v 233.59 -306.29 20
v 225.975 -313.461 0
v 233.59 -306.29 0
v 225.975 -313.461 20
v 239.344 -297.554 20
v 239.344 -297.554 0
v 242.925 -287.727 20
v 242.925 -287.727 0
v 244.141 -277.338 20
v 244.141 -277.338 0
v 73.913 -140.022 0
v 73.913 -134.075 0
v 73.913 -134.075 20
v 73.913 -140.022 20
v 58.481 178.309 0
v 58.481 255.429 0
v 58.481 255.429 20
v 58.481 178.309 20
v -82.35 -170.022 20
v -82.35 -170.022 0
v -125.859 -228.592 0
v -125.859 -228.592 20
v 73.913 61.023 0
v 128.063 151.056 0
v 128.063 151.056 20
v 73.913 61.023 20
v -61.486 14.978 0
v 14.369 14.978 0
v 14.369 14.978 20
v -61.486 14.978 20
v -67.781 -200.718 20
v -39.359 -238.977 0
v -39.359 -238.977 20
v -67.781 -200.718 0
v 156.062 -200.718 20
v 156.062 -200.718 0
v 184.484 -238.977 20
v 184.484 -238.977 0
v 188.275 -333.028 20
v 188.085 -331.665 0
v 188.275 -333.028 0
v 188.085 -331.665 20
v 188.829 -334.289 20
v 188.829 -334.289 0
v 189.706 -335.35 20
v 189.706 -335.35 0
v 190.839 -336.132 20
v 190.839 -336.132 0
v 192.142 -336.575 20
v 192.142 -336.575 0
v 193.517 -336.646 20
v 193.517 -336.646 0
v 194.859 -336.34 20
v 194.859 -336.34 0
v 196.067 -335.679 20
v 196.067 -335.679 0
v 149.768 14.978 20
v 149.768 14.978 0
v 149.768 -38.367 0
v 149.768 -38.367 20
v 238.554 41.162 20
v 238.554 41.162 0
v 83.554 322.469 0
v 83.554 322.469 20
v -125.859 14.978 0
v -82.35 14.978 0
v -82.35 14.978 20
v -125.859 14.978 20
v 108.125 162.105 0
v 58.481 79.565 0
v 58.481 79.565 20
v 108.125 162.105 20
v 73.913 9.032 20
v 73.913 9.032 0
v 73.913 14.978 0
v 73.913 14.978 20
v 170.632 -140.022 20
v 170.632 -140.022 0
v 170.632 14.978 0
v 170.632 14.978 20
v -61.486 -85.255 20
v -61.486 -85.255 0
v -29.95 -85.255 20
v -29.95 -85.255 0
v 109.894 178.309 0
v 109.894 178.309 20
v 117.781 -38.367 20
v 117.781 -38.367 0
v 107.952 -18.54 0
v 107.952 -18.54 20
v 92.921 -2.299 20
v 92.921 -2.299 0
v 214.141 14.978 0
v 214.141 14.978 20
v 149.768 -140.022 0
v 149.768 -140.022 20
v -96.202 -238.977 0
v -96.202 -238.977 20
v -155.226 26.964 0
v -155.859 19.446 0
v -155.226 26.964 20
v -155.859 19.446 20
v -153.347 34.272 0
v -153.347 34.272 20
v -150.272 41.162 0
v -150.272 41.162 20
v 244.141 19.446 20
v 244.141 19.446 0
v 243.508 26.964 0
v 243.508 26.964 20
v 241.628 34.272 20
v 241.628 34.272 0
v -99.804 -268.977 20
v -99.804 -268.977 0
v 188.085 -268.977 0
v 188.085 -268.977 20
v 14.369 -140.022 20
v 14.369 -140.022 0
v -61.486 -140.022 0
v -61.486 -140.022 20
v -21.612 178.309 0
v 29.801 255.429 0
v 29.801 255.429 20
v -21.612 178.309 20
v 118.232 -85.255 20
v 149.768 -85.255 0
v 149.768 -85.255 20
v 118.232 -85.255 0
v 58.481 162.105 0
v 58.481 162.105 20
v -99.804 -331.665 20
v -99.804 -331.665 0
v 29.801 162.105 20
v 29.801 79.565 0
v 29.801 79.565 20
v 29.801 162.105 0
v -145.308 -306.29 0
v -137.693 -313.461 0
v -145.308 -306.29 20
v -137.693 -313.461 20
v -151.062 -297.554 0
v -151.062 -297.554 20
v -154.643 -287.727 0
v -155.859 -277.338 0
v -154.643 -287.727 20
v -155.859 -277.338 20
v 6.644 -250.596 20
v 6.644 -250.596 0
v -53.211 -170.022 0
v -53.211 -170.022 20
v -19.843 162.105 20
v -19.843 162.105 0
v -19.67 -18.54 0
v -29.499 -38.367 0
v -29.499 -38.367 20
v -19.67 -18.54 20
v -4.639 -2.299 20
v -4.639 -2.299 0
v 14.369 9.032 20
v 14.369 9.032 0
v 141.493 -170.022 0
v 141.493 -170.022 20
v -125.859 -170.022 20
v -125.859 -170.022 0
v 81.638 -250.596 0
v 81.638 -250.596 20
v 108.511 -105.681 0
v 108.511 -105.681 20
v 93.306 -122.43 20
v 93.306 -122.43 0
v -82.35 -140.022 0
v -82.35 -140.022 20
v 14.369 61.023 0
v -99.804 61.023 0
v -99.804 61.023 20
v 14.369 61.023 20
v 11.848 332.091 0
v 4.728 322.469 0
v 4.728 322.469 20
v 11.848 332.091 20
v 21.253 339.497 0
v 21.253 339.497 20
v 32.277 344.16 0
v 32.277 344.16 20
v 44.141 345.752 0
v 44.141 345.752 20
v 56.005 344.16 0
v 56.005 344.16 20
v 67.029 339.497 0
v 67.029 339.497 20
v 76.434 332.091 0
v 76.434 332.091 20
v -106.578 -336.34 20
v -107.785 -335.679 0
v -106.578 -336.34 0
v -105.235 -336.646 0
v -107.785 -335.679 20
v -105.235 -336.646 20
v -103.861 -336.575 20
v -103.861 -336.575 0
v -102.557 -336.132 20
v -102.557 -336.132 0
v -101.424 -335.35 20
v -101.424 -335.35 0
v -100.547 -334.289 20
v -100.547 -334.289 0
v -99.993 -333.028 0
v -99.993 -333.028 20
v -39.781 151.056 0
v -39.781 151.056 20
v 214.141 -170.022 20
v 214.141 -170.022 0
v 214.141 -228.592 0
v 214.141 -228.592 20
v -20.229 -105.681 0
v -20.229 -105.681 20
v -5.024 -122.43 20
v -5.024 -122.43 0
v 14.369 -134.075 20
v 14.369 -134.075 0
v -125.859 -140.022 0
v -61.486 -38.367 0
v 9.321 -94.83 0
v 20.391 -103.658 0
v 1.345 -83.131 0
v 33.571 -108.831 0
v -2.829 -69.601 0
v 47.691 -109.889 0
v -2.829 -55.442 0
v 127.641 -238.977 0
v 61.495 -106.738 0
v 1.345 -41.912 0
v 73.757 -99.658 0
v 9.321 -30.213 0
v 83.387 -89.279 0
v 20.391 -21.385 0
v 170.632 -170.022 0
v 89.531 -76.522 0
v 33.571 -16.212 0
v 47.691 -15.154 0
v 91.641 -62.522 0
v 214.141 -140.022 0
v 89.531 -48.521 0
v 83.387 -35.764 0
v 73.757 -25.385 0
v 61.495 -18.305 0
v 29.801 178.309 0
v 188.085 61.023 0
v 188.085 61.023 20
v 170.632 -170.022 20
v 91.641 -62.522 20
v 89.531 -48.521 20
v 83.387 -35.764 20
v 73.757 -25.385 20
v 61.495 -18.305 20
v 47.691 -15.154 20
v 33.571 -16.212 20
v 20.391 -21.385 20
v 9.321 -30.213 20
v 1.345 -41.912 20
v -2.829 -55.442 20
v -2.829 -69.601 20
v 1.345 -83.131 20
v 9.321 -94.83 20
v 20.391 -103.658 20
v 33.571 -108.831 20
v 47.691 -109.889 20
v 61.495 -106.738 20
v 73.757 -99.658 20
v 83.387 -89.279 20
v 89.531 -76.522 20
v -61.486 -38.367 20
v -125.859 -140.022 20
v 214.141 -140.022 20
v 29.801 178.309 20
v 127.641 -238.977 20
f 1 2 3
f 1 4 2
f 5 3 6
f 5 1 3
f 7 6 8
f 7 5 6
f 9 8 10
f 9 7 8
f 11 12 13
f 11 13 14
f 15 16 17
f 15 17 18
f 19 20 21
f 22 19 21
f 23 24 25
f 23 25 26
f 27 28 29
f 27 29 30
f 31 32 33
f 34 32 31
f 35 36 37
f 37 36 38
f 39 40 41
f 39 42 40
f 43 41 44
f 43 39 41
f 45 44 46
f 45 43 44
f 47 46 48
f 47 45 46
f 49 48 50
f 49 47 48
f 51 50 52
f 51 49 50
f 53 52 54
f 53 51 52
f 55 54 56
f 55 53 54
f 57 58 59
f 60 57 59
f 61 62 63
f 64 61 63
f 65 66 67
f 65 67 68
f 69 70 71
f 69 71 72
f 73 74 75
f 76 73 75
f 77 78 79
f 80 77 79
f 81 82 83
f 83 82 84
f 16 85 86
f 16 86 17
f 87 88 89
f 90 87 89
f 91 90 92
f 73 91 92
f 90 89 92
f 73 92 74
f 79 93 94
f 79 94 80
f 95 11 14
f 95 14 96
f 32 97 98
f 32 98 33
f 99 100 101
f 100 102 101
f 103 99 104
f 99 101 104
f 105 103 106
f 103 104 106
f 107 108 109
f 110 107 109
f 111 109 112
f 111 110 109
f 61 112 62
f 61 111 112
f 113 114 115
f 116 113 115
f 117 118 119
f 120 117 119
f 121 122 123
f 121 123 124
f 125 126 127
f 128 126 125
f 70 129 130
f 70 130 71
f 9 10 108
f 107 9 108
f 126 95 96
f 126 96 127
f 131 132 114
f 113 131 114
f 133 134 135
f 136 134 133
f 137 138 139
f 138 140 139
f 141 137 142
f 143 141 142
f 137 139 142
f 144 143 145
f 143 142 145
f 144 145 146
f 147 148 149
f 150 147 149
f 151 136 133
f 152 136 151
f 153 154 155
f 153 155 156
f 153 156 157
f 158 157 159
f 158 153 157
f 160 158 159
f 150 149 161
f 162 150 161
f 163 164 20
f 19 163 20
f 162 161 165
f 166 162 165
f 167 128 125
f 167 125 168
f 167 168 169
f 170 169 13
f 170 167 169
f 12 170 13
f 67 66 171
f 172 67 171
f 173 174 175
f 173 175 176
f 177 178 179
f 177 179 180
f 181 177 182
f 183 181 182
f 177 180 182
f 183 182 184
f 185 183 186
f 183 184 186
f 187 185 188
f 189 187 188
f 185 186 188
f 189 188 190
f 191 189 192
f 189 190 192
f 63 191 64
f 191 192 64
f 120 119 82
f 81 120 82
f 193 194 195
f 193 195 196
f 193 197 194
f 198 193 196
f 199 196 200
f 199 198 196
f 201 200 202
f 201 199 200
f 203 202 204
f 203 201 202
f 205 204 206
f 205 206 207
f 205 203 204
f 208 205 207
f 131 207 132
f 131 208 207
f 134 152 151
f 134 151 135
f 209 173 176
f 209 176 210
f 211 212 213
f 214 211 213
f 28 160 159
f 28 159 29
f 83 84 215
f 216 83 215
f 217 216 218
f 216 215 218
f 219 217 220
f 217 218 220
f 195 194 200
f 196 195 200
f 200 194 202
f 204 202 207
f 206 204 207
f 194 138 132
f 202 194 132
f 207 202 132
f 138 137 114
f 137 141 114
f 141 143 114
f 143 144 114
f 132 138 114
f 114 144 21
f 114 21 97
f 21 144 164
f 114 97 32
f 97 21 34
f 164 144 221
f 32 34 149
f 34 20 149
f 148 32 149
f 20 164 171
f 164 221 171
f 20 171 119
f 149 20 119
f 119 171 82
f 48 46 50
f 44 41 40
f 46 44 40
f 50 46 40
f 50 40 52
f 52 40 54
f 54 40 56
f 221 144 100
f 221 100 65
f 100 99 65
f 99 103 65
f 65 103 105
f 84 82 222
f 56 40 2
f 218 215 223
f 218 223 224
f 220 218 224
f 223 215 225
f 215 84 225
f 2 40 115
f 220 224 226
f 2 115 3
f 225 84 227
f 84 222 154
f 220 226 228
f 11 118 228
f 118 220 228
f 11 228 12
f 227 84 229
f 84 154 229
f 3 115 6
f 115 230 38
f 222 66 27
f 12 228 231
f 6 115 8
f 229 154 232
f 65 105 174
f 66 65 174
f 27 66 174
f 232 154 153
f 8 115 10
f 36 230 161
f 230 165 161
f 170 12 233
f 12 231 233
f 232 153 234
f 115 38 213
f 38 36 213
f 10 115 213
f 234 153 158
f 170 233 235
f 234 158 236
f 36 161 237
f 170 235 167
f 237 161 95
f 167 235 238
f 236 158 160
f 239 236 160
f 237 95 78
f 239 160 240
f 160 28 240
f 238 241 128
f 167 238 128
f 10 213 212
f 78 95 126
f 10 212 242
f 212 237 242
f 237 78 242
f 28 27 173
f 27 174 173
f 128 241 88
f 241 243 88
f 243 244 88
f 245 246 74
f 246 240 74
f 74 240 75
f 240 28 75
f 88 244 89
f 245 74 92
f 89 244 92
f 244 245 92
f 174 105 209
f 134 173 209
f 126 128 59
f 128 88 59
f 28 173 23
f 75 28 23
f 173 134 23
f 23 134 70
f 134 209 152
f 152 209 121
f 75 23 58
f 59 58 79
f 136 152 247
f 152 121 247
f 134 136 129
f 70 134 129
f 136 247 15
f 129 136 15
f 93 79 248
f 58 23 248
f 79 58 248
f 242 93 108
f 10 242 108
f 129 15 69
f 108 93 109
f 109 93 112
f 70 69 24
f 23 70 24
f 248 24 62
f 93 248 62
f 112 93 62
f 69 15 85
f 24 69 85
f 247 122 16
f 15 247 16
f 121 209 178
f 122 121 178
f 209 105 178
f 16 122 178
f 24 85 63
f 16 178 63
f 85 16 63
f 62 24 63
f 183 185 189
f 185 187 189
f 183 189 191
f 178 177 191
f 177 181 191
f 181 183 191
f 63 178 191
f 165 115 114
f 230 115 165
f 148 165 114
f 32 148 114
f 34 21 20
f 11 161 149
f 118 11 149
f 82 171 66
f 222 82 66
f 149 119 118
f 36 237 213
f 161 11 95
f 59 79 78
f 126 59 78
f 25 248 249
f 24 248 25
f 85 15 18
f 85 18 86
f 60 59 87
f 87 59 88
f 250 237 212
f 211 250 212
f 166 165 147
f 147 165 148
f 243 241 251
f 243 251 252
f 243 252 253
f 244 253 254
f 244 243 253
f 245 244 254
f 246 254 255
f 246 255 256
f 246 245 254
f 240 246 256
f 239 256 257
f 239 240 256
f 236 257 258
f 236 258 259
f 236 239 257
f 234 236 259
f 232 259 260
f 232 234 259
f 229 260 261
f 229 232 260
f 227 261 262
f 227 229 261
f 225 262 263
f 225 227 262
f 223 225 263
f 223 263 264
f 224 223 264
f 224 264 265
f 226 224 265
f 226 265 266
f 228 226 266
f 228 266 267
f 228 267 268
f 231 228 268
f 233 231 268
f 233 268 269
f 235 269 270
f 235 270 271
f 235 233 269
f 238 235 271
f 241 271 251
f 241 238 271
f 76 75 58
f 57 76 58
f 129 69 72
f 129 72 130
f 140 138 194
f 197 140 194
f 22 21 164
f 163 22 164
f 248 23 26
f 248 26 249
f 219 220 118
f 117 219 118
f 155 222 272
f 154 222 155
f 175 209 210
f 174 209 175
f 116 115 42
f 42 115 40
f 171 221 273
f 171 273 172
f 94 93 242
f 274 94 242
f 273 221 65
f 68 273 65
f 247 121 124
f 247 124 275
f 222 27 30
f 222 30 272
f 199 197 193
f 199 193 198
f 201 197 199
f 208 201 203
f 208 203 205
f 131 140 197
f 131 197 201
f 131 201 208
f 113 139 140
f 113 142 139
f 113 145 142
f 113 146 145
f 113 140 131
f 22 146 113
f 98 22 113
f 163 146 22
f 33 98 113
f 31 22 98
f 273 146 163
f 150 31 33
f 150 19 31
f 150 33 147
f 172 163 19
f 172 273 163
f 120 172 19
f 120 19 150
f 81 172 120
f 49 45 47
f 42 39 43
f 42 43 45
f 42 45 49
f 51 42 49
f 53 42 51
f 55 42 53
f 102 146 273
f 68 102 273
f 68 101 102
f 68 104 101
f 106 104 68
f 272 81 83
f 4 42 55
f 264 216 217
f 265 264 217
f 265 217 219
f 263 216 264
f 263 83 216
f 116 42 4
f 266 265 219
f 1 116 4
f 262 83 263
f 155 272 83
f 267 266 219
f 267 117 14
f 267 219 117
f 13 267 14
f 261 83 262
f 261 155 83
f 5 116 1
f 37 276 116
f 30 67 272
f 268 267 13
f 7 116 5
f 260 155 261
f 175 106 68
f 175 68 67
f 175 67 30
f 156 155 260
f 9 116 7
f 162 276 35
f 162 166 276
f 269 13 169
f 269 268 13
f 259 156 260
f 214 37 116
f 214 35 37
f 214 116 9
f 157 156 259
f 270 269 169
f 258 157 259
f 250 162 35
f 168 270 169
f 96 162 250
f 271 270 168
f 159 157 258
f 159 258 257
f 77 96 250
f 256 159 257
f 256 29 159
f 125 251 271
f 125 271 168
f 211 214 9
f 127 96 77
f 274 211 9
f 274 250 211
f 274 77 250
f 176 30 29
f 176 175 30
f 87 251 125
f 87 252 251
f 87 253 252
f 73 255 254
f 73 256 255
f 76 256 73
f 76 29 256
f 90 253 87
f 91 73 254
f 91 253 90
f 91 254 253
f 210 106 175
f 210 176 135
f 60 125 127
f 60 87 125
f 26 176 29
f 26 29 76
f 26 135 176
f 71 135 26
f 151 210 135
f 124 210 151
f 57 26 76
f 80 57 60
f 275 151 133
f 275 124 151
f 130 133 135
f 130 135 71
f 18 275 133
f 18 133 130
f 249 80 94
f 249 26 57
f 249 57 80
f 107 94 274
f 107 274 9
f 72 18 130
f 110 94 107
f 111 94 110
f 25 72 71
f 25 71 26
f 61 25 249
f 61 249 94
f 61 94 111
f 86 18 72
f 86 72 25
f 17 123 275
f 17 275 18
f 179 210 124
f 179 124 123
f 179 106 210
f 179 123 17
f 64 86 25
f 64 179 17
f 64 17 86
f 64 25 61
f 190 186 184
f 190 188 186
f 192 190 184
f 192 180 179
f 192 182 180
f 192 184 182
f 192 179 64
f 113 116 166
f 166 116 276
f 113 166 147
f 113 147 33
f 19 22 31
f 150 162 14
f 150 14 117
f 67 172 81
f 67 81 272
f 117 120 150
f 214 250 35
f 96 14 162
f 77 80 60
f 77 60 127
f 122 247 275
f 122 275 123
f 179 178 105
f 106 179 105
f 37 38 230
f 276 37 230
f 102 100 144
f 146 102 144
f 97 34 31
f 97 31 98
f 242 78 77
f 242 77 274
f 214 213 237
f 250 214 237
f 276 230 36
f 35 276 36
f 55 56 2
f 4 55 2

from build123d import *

# Parameters (mm, degrees)
SKETCH1_R           = 47.5
BOSS_EXTRUDE1_DEPTH = 20
FILLET1_R           = 45
FILLET2_R           = 5


with BuildPart() as part:
    # Sketch1 → Boss-Extrude1 (new body)
    with BuildSketch(Plane.XY):
        Polygon((-99.803538153, -268.977427834), (188.085436338, -268.977427834), (188.085436338, -341.607655446), (244.140949093, -299.966804473), (244.140949093, -268.977427834), (244.140949093, 31.022572166), (44.140949093, 393.998813233), (-155.859050907, 31.022572166), (-155.859050907, -268.977427834), (-155.859050907, -299.966804473), (-99.803538153, -341.607655446), align=None)
        with Locations((44.140949093, -62.521501175)):
            Circle(SKETCH1_R, mode=Mode.SUBTRACT)
        Polygon((-125.859050907, -170.021501175), (-82.349617269, -170.021501175), (-125.859050907, -228.592437053), align=None, mode=Mode.SUBTRACT)
        Polygon((6.643511339, -250.596190725), (-53.211415944, -170.021501175), (141.493314129, -170.021501175), (81.638386846, -250.596190725), align=None, mode=Mode.SUBTRACT)
        Polygon((184.483743739, -238.977427834), (127.641085844, -238.977427834), (156.062414792, -200.717590916), align=None, mode=Mode.SUBTRACT)
        Polygon((-125.859050907, -140.021501175), (-82.349617269, -140.021501175), (-82.349617269, -90.186397517), (-82.349617269, -47.519598178), (-82.349617269, 14.978498825), (-125.859050907, 14.978498825), (-125.859050907, -47.519598178), (-125.859050907, -90.186397517), align=None, mode=Mode.SUBTRACT)
        Polygon((29.800552112, 255.428707564), (-21.612263577, 178.30948403), (29.800552112, 178.30948403), align=None, mode=Mode.SUBTRACT)
        Polygon((188.085436338, 61.022572166), (128.063188969, 151.05594322), (73.913154487, 61.022572166), align=None, mode=Mode.SUBTRACT)
        Polygon((-99.803538153, 61.022572166), (14.368743698, 61.022572166), (-39.781290784, 151.05594322), align=None, mode=Mode.SUBTRACT)
        Polygon((214.140949093, -228.592437053), (170.631515454, -170.021501175), (214.140949093, -170.021501175), align=None, mode=Mode.SUBTRACT)
        Polygon((214.140949093, -140.021501175), (214.140949093, -90.186397517), (214.140949093, -47.519598178), (214.140949093, 14.978498825), (170.631515454, 14.978498825), (170.631515454, -47.519598178), (170.631515454, -90.186397517), (170.631515454, -140.021501175), align=None, mode=Mode.SUBTRACT)
        Polygon((-96.201845554, -238.977427834), (-39.359187659, -238.977427834), (-67.780516606, -200.717590916), align=None, mode=Mode.SUBTRACT)
        with BuildLine():
            Line((-61.485967642, 14.978498825), (-61.485967642, -38.366786979))
            Line((-61.485967642, -38.366786979), (-29.498712654, -38.366786979))
            ThreePointArc((-29.498712654, -38.366786979), (-12.737505242, -9.880343963), (14.368743698, 9.03173625))
            Line((14.368743698, 9.03173625), (14.368743698, 14.978498825))
            Line((14.368743698, 14.978498825), (-61.485967642, 14.978498825))
        make_face(mode=Mode.SUBTRACT)
        with BuildLine():
            Line((-61.485967642, -140.021501175), (-61.485967642, -85.255349829))
            Line((-61.485967642, -85.255349829), (-29.949685439, -85.255349829))
            ThreePointArc((-29.949685439, -85.255349829), (-13.241152292, -114.6131938), (14.368743698, -134.074738599))
            Line((14.368743698, -134.074738599), (14.368743698, -140.021501175))
            Line((14.368743698, -140.021501175), (-61.485967642, -140.021501175))
        make_face(mode=Mode.SUBTRACT)
        with BuildLine():
            Line((73.913154487, -134.074738599), (73.913154487, -140.021501175))
            Line((73.913154487, -140.021501175), (149.767865827, -140.021501175))
            Line((149.767865827, -140.021501175), (149.767865827, -85.255349829))
            Line((149.767865827, -85.255349829), (118.231583625, -85.255349829))
            ThreePointArc((118.231583625, -85.255349829), (101.523050478, -114.6131938), (73.913154487, -134.074738599))
        make_face(mode=Mode.SUBTRACT)
        with BuildLine():
            Line((73.913154487, 9.03173625), (73.913154487, 14.978498825))
            Line((73.913154487, 14.978498825), (149.767865827, 14.978498825))
            Line((149.767865827, 14.978498825), (149.767865827, -38.366786979))
            Line((149.767865827, -38.366786979), (117.780610839, -38.366786979))
            ThreePointArc((117.780610839, -38.366786979), (101.019403427, -9.880343963), (73.913154487, 9.03173625))
        make_face(mode=Mode.SUBTRACT)
        Polygon((108.124840655, 162.105125634), (58.481346073, 162.105125634), (58.481346073, 79.564621072), align=None, mode=Mode.SUBTRACT)
        Polygon((109.894161762, 178.30948403), (58.481346073, 255.428707564), (58.481346073, 178.30948403), align=None, mode=Mode.SUBTRACT)
        Polygon((-19.84294247, 162.105125634), (29.800552112, 79.564621072), (29.800552112, 162.105125634), align=None, mode=Mode.SUBTRACT)
    extrude(amount=BOSS_EXTRUDE1_DEPTH)

    # Fillet1
    fillet1_edges = [part.edges().sort_by_distance(p)[0] for p in [
        (244.140949093, -299.966804473, 10),
        (-155.859050907, -299.966804473, 10),
        (-155.859050907, 31.022572166, 10),
        (44.140949093, 393.998813233, 10),
        (244.140949093, 31.022572166, 10),
    ]]
    fillet(fillet1_edges, radius=FILLET1_R)

    # Fillet2
    fillet2_edges = [part.edges().sort_by_distance(p)[0] for p in [
        (188.085436338, -341.607655446, 10),
        (-99.803538153, -341.607655446, 10),
    ]]
    fillet(fillet2_edges, radius=FILLET2_R)


solid = part.part
